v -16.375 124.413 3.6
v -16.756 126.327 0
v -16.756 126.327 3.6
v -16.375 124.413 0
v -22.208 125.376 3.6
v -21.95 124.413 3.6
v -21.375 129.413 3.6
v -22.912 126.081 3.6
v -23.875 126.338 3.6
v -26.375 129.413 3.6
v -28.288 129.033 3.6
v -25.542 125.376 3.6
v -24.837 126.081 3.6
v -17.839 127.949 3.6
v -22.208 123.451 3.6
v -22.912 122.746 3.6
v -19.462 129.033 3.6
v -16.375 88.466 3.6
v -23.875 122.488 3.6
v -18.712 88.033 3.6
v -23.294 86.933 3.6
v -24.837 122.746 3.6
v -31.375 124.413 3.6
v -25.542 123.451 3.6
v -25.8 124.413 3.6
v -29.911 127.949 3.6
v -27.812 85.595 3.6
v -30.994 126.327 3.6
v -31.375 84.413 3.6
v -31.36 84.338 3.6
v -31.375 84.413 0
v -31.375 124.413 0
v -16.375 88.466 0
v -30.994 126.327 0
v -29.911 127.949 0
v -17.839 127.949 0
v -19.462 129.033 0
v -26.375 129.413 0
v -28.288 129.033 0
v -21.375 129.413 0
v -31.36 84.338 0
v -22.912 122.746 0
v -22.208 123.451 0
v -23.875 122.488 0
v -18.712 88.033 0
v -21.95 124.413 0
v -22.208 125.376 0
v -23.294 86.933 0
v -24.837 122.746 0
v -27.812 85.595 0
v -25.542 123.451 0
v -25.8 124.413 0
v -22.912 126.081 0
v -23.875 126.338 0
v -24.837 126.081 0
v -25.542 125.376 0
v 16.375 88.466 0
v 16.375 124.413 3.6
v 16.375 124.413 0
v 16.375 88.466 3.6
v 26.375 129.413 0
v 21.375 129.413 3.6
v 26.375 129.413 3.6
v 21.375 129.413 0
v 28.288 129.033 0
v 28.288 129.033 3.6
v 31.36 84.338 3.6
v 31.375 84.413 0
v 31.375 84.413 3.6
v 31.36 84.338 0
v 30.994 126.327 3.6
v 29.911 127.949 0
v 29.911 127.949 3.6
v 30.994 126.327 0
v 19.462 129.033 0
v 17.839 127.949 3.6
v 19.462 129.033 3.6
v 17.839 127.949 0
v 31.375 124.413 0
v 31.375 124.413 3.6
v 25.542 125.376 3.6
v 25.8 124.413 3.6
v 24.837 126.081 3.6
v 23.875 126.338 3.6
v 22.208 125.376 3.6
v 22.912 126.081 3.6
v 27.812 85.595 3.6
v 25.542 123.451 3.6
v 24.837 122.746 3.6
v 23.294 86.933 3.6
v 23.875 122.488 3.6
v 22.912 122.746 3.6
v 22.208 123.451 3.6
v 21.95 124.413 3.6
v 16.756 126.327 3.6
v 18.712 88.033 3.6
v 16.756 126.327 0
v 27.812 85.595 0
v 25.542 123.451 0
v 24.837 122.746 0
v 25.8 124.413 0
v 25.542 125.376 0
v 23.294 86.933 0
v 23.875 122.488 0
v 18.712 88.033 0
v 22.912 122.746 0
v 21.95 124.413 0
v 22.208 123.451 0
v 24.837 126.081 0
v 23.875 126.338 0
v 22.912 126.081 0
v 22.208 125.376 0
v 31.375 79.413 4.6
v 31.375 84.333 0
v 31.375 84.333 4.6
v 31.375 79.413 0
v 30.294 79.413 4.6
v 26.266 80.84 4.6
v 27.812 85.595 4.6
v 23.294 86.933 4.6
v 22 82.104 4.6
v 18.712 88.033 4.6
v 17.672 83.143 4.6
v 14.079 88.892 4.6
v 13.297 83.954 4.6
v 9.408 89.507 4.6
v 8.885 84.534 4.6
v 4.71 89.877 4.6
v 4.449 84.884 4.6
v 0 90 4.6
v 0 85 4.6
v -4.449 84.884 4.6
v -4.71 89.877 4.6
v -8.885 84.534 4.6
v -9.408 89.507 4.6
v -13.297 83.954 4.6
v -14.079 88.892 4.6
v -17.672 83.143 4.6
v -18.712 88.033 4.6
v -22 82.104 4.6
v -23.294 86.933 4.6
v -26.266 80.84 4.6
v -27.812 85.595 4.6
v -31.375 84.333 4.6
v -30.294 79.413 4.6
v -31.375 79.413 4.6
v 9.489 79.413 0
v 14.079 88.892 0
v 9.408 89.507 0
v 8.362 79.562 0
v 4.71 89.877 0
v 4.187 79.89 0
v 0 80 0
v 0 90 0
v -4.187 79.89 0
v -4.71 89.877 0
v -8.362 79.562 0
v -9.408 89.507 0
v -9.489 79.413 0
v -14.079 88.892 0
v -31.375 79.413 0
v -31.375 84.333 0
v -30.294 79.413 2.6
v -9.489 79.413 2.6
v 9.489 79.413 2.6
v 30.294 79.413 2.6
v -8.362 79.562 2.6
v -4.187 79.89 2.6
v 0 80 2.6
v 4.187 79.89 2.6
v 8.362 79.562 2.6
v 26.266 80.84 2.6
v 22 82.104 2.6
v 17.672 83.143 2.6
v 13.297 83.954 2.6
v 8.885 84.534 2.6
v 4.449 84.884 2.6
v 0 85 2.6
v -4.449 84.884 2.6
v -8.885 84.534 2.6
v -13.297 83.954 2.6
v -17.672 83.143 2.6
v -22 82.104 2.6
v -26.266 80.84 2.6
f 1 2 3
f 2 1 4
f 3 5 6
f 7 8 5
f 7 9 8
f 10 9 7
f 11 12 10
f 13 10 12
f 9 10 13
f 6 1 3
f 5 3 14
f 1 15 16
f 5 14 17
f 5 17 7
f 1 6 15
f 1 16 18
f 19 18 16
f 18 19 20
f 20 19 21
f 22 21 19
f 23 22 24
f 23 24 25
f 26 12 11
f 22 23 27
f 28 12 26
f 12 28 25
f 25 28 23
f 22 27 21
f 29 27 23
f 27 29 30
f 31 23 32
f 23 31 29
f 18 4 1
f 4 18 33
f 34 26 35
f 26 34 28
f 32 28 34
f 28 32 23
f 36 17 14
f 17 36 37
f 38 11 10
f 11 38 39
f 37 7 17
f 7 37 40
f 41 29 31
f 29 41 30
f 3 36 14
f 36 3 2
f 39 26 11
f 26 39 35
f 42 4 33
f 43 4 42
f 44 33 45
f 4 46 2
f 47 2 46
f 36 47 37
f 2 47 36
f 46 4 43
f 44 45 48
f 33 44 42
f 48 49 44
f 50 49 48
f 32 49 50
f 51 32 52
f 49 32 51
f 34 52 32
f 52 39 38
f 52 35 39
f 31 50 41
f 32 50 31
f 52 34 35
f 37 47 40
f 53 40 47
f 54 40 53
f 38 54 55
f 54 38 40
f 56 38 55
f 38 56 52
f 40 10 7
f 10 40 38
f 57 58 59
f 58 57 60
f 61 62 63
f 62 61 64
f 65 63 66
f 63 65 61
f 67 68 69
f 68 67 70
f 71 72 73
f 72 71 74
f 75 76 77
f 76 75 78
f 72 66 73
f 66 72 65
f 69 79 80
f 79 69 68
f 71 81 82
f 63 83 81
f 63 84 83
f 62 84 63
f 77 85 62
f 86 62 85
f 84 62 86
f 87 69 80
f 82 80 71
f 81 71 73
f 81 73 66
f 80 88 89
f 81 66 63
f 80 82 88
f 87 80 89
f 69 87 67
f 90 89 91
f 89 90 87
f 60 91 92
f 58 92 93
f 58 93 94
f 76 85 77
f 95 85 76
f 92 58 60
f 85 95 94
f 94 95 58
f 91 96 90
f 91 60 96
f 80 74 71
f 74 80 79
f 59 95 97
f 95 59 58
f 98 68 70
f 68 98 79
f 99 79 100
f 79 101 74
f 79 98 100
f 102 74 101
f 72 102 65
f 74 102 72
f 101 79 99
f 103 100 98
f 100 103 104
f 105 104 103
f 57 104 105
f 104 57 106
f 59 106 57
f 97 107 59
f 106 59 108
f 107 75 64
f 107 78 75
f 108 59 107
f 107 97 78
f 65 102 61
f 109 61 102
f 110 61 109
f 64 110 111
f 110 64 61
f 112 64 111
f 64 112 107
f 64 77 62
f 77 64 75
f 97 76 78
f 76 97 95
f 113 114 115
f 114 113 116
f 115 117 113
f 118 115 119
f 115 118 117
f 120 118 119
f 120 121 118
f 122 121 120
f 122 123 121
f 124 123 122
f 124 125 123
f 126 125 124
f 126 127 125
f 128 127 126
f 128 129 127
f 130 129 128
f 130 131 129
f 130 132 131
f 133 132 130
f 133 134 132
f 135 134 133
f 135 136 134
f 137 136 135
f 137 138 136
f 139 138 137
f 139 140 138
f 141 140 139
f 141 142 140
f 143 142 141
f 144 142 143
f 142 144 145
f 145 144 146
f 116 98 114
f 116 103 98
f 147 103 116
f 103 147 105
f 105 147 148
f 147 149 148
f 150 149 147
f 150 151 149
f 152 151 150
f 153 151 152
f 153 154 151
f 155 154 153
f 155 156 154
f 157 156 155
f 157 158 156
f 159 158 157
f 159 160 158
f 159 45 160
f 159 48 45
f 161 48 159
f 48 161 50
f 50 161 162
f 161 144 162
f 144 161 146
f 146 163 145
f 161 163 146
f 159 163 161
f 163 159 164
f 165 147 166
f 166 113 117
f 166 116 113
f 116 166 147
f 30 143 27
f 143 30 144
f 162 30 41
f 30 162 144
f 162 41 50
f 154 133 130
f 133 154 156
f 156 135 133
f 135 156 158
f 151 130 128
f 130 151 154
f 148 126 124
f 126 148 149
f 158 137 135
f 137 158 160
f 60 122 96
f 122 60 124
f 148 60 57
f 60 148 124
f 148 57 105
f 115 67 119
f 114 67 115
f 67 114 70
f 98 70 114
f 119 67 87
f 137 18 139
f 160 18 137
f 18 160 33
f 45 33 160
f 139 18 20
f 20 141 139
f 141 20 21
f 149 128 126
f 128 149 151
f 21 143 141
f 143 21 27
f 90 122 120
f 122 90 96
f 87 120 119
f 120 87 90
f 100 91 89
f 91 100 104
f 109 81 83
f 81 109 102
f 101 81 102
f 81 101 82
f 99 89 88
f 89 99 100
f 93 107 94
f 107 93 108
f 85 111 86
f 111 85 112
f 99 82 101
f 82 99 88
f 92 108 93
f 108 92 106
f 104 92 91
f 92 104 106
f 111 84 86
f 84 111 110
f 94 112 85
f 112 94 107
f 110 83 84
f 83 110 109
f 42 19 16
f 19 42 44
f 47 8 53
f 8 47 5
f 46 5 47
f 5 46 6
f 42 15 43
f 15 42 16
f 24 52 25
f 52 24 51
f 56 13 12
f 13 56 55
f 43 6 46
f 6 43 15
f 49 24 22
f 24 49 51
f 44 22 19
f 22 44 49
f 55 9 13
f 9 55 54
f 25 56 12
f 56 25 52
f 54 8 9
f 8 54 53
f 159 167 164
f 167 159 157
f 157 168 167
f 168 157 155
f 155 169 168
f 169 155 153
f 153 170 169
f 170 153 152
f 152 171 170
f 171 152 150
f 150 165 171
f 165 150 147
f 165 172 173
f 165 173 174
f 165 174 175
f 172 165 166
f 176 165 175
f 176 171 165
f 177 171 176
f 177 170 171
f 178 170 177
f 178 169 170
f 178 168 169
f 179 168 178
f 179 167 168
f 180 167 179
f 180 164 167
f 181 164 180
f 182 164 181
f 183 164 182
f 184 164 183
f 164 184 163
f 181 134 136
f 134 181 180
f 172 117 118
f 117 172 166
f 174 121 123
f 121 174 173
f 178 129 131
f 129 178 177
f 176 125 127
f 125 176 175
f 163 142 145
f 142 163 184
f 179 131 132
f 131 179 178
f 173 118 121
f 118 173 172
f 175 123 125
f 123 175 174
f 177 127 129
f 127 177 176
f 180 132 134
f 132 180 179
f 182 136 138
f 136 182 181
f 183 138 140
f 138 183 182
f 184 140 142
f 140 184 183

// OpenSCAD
// file: configuration.scad
// Increase this if your slicer or printer make holes too tight.
extra_radius = 0.3;

// OD = outside diameter, corner to corner.
m3_nut_od = 6.1;
m3_nut_radius = m3_nut_od/2 + 0.2 + extra_radius;

// Major diameter of metric 3mm thread.
m3_major = 2.85;
m3_radius = m3_major/2 + extra_radius;
m3_wide_radius = m3_major/2 + 0.2 + extra_radius;

// NEMA17 stepper motors.
motor_shaft_diameter = 5;
motor_shaft_radius = motor_shaft_diameter/2 + extra_radius;

// Frame brackets.
thickness = 3.6;
// main file
include <configuration.scad>;

glass_diameter = 170; // mm
glass_radius = glass_diameter/2;
glass_thickness = 2.9; // mm
triangle_openbeam = 360; // mm length
clip_width = 31.75; // mm

// Intersection points between inside edges of triangle OpenBeam.
triangle_inside = triangle_openbeam + 45;

// Distance from center to inside edge of OpenBeam.
triangle_offset = triangle_inside/2 * tan(30) + 7.5;

// Borosilicate glass.
translate([0, 0, thickness-1]) %
  cylinder(r=glass_radius, h=glass_thickness, $fn=120);

// OpenBeam triangle.
for (a = [0:120:359]) {
  rotate([0, 0, a]) {
    translate([0, triangle_offset, -7.5]) %
      cube([triangle_openbeam, 15, 15], center=true);
  }
}

module frame_glass() {
  difference() {
    union() {
      translate([0, triangle_offset-20, thickness/2]) minkowski() {
        difference() {
          cube([clip_width+21, 40, thickness-1], center=true);
          cube([clip_width+11, 50, 20], center=true);
        }
        cylinder(r=5, h=1, center=true);
      }
      intersection() {
        translate([0, triangle_offset-20, (thickness+1)/2])
          cube([clip_width+31, 50, thickness+1], center=true);
        cylinder(r=glass_radius+5, h=20, center=true, $fn=120);
      }
    }
    cylinder(r=glass_radius-5, h=20, center=true, $fn=120);
    translate([0, 0, thickness-1])
      cylinder(r=glass_radius, h=glass_thickness, $fn=120);
    for (x = [clip_width/2+8, -clip_width/2-8]) {
      translate([x, triangle_offset, 0]) #
        cylinder(r=m3_wide_radius, h=20, center=true, $fn=12);
    }
  }
}

frame_glass();
